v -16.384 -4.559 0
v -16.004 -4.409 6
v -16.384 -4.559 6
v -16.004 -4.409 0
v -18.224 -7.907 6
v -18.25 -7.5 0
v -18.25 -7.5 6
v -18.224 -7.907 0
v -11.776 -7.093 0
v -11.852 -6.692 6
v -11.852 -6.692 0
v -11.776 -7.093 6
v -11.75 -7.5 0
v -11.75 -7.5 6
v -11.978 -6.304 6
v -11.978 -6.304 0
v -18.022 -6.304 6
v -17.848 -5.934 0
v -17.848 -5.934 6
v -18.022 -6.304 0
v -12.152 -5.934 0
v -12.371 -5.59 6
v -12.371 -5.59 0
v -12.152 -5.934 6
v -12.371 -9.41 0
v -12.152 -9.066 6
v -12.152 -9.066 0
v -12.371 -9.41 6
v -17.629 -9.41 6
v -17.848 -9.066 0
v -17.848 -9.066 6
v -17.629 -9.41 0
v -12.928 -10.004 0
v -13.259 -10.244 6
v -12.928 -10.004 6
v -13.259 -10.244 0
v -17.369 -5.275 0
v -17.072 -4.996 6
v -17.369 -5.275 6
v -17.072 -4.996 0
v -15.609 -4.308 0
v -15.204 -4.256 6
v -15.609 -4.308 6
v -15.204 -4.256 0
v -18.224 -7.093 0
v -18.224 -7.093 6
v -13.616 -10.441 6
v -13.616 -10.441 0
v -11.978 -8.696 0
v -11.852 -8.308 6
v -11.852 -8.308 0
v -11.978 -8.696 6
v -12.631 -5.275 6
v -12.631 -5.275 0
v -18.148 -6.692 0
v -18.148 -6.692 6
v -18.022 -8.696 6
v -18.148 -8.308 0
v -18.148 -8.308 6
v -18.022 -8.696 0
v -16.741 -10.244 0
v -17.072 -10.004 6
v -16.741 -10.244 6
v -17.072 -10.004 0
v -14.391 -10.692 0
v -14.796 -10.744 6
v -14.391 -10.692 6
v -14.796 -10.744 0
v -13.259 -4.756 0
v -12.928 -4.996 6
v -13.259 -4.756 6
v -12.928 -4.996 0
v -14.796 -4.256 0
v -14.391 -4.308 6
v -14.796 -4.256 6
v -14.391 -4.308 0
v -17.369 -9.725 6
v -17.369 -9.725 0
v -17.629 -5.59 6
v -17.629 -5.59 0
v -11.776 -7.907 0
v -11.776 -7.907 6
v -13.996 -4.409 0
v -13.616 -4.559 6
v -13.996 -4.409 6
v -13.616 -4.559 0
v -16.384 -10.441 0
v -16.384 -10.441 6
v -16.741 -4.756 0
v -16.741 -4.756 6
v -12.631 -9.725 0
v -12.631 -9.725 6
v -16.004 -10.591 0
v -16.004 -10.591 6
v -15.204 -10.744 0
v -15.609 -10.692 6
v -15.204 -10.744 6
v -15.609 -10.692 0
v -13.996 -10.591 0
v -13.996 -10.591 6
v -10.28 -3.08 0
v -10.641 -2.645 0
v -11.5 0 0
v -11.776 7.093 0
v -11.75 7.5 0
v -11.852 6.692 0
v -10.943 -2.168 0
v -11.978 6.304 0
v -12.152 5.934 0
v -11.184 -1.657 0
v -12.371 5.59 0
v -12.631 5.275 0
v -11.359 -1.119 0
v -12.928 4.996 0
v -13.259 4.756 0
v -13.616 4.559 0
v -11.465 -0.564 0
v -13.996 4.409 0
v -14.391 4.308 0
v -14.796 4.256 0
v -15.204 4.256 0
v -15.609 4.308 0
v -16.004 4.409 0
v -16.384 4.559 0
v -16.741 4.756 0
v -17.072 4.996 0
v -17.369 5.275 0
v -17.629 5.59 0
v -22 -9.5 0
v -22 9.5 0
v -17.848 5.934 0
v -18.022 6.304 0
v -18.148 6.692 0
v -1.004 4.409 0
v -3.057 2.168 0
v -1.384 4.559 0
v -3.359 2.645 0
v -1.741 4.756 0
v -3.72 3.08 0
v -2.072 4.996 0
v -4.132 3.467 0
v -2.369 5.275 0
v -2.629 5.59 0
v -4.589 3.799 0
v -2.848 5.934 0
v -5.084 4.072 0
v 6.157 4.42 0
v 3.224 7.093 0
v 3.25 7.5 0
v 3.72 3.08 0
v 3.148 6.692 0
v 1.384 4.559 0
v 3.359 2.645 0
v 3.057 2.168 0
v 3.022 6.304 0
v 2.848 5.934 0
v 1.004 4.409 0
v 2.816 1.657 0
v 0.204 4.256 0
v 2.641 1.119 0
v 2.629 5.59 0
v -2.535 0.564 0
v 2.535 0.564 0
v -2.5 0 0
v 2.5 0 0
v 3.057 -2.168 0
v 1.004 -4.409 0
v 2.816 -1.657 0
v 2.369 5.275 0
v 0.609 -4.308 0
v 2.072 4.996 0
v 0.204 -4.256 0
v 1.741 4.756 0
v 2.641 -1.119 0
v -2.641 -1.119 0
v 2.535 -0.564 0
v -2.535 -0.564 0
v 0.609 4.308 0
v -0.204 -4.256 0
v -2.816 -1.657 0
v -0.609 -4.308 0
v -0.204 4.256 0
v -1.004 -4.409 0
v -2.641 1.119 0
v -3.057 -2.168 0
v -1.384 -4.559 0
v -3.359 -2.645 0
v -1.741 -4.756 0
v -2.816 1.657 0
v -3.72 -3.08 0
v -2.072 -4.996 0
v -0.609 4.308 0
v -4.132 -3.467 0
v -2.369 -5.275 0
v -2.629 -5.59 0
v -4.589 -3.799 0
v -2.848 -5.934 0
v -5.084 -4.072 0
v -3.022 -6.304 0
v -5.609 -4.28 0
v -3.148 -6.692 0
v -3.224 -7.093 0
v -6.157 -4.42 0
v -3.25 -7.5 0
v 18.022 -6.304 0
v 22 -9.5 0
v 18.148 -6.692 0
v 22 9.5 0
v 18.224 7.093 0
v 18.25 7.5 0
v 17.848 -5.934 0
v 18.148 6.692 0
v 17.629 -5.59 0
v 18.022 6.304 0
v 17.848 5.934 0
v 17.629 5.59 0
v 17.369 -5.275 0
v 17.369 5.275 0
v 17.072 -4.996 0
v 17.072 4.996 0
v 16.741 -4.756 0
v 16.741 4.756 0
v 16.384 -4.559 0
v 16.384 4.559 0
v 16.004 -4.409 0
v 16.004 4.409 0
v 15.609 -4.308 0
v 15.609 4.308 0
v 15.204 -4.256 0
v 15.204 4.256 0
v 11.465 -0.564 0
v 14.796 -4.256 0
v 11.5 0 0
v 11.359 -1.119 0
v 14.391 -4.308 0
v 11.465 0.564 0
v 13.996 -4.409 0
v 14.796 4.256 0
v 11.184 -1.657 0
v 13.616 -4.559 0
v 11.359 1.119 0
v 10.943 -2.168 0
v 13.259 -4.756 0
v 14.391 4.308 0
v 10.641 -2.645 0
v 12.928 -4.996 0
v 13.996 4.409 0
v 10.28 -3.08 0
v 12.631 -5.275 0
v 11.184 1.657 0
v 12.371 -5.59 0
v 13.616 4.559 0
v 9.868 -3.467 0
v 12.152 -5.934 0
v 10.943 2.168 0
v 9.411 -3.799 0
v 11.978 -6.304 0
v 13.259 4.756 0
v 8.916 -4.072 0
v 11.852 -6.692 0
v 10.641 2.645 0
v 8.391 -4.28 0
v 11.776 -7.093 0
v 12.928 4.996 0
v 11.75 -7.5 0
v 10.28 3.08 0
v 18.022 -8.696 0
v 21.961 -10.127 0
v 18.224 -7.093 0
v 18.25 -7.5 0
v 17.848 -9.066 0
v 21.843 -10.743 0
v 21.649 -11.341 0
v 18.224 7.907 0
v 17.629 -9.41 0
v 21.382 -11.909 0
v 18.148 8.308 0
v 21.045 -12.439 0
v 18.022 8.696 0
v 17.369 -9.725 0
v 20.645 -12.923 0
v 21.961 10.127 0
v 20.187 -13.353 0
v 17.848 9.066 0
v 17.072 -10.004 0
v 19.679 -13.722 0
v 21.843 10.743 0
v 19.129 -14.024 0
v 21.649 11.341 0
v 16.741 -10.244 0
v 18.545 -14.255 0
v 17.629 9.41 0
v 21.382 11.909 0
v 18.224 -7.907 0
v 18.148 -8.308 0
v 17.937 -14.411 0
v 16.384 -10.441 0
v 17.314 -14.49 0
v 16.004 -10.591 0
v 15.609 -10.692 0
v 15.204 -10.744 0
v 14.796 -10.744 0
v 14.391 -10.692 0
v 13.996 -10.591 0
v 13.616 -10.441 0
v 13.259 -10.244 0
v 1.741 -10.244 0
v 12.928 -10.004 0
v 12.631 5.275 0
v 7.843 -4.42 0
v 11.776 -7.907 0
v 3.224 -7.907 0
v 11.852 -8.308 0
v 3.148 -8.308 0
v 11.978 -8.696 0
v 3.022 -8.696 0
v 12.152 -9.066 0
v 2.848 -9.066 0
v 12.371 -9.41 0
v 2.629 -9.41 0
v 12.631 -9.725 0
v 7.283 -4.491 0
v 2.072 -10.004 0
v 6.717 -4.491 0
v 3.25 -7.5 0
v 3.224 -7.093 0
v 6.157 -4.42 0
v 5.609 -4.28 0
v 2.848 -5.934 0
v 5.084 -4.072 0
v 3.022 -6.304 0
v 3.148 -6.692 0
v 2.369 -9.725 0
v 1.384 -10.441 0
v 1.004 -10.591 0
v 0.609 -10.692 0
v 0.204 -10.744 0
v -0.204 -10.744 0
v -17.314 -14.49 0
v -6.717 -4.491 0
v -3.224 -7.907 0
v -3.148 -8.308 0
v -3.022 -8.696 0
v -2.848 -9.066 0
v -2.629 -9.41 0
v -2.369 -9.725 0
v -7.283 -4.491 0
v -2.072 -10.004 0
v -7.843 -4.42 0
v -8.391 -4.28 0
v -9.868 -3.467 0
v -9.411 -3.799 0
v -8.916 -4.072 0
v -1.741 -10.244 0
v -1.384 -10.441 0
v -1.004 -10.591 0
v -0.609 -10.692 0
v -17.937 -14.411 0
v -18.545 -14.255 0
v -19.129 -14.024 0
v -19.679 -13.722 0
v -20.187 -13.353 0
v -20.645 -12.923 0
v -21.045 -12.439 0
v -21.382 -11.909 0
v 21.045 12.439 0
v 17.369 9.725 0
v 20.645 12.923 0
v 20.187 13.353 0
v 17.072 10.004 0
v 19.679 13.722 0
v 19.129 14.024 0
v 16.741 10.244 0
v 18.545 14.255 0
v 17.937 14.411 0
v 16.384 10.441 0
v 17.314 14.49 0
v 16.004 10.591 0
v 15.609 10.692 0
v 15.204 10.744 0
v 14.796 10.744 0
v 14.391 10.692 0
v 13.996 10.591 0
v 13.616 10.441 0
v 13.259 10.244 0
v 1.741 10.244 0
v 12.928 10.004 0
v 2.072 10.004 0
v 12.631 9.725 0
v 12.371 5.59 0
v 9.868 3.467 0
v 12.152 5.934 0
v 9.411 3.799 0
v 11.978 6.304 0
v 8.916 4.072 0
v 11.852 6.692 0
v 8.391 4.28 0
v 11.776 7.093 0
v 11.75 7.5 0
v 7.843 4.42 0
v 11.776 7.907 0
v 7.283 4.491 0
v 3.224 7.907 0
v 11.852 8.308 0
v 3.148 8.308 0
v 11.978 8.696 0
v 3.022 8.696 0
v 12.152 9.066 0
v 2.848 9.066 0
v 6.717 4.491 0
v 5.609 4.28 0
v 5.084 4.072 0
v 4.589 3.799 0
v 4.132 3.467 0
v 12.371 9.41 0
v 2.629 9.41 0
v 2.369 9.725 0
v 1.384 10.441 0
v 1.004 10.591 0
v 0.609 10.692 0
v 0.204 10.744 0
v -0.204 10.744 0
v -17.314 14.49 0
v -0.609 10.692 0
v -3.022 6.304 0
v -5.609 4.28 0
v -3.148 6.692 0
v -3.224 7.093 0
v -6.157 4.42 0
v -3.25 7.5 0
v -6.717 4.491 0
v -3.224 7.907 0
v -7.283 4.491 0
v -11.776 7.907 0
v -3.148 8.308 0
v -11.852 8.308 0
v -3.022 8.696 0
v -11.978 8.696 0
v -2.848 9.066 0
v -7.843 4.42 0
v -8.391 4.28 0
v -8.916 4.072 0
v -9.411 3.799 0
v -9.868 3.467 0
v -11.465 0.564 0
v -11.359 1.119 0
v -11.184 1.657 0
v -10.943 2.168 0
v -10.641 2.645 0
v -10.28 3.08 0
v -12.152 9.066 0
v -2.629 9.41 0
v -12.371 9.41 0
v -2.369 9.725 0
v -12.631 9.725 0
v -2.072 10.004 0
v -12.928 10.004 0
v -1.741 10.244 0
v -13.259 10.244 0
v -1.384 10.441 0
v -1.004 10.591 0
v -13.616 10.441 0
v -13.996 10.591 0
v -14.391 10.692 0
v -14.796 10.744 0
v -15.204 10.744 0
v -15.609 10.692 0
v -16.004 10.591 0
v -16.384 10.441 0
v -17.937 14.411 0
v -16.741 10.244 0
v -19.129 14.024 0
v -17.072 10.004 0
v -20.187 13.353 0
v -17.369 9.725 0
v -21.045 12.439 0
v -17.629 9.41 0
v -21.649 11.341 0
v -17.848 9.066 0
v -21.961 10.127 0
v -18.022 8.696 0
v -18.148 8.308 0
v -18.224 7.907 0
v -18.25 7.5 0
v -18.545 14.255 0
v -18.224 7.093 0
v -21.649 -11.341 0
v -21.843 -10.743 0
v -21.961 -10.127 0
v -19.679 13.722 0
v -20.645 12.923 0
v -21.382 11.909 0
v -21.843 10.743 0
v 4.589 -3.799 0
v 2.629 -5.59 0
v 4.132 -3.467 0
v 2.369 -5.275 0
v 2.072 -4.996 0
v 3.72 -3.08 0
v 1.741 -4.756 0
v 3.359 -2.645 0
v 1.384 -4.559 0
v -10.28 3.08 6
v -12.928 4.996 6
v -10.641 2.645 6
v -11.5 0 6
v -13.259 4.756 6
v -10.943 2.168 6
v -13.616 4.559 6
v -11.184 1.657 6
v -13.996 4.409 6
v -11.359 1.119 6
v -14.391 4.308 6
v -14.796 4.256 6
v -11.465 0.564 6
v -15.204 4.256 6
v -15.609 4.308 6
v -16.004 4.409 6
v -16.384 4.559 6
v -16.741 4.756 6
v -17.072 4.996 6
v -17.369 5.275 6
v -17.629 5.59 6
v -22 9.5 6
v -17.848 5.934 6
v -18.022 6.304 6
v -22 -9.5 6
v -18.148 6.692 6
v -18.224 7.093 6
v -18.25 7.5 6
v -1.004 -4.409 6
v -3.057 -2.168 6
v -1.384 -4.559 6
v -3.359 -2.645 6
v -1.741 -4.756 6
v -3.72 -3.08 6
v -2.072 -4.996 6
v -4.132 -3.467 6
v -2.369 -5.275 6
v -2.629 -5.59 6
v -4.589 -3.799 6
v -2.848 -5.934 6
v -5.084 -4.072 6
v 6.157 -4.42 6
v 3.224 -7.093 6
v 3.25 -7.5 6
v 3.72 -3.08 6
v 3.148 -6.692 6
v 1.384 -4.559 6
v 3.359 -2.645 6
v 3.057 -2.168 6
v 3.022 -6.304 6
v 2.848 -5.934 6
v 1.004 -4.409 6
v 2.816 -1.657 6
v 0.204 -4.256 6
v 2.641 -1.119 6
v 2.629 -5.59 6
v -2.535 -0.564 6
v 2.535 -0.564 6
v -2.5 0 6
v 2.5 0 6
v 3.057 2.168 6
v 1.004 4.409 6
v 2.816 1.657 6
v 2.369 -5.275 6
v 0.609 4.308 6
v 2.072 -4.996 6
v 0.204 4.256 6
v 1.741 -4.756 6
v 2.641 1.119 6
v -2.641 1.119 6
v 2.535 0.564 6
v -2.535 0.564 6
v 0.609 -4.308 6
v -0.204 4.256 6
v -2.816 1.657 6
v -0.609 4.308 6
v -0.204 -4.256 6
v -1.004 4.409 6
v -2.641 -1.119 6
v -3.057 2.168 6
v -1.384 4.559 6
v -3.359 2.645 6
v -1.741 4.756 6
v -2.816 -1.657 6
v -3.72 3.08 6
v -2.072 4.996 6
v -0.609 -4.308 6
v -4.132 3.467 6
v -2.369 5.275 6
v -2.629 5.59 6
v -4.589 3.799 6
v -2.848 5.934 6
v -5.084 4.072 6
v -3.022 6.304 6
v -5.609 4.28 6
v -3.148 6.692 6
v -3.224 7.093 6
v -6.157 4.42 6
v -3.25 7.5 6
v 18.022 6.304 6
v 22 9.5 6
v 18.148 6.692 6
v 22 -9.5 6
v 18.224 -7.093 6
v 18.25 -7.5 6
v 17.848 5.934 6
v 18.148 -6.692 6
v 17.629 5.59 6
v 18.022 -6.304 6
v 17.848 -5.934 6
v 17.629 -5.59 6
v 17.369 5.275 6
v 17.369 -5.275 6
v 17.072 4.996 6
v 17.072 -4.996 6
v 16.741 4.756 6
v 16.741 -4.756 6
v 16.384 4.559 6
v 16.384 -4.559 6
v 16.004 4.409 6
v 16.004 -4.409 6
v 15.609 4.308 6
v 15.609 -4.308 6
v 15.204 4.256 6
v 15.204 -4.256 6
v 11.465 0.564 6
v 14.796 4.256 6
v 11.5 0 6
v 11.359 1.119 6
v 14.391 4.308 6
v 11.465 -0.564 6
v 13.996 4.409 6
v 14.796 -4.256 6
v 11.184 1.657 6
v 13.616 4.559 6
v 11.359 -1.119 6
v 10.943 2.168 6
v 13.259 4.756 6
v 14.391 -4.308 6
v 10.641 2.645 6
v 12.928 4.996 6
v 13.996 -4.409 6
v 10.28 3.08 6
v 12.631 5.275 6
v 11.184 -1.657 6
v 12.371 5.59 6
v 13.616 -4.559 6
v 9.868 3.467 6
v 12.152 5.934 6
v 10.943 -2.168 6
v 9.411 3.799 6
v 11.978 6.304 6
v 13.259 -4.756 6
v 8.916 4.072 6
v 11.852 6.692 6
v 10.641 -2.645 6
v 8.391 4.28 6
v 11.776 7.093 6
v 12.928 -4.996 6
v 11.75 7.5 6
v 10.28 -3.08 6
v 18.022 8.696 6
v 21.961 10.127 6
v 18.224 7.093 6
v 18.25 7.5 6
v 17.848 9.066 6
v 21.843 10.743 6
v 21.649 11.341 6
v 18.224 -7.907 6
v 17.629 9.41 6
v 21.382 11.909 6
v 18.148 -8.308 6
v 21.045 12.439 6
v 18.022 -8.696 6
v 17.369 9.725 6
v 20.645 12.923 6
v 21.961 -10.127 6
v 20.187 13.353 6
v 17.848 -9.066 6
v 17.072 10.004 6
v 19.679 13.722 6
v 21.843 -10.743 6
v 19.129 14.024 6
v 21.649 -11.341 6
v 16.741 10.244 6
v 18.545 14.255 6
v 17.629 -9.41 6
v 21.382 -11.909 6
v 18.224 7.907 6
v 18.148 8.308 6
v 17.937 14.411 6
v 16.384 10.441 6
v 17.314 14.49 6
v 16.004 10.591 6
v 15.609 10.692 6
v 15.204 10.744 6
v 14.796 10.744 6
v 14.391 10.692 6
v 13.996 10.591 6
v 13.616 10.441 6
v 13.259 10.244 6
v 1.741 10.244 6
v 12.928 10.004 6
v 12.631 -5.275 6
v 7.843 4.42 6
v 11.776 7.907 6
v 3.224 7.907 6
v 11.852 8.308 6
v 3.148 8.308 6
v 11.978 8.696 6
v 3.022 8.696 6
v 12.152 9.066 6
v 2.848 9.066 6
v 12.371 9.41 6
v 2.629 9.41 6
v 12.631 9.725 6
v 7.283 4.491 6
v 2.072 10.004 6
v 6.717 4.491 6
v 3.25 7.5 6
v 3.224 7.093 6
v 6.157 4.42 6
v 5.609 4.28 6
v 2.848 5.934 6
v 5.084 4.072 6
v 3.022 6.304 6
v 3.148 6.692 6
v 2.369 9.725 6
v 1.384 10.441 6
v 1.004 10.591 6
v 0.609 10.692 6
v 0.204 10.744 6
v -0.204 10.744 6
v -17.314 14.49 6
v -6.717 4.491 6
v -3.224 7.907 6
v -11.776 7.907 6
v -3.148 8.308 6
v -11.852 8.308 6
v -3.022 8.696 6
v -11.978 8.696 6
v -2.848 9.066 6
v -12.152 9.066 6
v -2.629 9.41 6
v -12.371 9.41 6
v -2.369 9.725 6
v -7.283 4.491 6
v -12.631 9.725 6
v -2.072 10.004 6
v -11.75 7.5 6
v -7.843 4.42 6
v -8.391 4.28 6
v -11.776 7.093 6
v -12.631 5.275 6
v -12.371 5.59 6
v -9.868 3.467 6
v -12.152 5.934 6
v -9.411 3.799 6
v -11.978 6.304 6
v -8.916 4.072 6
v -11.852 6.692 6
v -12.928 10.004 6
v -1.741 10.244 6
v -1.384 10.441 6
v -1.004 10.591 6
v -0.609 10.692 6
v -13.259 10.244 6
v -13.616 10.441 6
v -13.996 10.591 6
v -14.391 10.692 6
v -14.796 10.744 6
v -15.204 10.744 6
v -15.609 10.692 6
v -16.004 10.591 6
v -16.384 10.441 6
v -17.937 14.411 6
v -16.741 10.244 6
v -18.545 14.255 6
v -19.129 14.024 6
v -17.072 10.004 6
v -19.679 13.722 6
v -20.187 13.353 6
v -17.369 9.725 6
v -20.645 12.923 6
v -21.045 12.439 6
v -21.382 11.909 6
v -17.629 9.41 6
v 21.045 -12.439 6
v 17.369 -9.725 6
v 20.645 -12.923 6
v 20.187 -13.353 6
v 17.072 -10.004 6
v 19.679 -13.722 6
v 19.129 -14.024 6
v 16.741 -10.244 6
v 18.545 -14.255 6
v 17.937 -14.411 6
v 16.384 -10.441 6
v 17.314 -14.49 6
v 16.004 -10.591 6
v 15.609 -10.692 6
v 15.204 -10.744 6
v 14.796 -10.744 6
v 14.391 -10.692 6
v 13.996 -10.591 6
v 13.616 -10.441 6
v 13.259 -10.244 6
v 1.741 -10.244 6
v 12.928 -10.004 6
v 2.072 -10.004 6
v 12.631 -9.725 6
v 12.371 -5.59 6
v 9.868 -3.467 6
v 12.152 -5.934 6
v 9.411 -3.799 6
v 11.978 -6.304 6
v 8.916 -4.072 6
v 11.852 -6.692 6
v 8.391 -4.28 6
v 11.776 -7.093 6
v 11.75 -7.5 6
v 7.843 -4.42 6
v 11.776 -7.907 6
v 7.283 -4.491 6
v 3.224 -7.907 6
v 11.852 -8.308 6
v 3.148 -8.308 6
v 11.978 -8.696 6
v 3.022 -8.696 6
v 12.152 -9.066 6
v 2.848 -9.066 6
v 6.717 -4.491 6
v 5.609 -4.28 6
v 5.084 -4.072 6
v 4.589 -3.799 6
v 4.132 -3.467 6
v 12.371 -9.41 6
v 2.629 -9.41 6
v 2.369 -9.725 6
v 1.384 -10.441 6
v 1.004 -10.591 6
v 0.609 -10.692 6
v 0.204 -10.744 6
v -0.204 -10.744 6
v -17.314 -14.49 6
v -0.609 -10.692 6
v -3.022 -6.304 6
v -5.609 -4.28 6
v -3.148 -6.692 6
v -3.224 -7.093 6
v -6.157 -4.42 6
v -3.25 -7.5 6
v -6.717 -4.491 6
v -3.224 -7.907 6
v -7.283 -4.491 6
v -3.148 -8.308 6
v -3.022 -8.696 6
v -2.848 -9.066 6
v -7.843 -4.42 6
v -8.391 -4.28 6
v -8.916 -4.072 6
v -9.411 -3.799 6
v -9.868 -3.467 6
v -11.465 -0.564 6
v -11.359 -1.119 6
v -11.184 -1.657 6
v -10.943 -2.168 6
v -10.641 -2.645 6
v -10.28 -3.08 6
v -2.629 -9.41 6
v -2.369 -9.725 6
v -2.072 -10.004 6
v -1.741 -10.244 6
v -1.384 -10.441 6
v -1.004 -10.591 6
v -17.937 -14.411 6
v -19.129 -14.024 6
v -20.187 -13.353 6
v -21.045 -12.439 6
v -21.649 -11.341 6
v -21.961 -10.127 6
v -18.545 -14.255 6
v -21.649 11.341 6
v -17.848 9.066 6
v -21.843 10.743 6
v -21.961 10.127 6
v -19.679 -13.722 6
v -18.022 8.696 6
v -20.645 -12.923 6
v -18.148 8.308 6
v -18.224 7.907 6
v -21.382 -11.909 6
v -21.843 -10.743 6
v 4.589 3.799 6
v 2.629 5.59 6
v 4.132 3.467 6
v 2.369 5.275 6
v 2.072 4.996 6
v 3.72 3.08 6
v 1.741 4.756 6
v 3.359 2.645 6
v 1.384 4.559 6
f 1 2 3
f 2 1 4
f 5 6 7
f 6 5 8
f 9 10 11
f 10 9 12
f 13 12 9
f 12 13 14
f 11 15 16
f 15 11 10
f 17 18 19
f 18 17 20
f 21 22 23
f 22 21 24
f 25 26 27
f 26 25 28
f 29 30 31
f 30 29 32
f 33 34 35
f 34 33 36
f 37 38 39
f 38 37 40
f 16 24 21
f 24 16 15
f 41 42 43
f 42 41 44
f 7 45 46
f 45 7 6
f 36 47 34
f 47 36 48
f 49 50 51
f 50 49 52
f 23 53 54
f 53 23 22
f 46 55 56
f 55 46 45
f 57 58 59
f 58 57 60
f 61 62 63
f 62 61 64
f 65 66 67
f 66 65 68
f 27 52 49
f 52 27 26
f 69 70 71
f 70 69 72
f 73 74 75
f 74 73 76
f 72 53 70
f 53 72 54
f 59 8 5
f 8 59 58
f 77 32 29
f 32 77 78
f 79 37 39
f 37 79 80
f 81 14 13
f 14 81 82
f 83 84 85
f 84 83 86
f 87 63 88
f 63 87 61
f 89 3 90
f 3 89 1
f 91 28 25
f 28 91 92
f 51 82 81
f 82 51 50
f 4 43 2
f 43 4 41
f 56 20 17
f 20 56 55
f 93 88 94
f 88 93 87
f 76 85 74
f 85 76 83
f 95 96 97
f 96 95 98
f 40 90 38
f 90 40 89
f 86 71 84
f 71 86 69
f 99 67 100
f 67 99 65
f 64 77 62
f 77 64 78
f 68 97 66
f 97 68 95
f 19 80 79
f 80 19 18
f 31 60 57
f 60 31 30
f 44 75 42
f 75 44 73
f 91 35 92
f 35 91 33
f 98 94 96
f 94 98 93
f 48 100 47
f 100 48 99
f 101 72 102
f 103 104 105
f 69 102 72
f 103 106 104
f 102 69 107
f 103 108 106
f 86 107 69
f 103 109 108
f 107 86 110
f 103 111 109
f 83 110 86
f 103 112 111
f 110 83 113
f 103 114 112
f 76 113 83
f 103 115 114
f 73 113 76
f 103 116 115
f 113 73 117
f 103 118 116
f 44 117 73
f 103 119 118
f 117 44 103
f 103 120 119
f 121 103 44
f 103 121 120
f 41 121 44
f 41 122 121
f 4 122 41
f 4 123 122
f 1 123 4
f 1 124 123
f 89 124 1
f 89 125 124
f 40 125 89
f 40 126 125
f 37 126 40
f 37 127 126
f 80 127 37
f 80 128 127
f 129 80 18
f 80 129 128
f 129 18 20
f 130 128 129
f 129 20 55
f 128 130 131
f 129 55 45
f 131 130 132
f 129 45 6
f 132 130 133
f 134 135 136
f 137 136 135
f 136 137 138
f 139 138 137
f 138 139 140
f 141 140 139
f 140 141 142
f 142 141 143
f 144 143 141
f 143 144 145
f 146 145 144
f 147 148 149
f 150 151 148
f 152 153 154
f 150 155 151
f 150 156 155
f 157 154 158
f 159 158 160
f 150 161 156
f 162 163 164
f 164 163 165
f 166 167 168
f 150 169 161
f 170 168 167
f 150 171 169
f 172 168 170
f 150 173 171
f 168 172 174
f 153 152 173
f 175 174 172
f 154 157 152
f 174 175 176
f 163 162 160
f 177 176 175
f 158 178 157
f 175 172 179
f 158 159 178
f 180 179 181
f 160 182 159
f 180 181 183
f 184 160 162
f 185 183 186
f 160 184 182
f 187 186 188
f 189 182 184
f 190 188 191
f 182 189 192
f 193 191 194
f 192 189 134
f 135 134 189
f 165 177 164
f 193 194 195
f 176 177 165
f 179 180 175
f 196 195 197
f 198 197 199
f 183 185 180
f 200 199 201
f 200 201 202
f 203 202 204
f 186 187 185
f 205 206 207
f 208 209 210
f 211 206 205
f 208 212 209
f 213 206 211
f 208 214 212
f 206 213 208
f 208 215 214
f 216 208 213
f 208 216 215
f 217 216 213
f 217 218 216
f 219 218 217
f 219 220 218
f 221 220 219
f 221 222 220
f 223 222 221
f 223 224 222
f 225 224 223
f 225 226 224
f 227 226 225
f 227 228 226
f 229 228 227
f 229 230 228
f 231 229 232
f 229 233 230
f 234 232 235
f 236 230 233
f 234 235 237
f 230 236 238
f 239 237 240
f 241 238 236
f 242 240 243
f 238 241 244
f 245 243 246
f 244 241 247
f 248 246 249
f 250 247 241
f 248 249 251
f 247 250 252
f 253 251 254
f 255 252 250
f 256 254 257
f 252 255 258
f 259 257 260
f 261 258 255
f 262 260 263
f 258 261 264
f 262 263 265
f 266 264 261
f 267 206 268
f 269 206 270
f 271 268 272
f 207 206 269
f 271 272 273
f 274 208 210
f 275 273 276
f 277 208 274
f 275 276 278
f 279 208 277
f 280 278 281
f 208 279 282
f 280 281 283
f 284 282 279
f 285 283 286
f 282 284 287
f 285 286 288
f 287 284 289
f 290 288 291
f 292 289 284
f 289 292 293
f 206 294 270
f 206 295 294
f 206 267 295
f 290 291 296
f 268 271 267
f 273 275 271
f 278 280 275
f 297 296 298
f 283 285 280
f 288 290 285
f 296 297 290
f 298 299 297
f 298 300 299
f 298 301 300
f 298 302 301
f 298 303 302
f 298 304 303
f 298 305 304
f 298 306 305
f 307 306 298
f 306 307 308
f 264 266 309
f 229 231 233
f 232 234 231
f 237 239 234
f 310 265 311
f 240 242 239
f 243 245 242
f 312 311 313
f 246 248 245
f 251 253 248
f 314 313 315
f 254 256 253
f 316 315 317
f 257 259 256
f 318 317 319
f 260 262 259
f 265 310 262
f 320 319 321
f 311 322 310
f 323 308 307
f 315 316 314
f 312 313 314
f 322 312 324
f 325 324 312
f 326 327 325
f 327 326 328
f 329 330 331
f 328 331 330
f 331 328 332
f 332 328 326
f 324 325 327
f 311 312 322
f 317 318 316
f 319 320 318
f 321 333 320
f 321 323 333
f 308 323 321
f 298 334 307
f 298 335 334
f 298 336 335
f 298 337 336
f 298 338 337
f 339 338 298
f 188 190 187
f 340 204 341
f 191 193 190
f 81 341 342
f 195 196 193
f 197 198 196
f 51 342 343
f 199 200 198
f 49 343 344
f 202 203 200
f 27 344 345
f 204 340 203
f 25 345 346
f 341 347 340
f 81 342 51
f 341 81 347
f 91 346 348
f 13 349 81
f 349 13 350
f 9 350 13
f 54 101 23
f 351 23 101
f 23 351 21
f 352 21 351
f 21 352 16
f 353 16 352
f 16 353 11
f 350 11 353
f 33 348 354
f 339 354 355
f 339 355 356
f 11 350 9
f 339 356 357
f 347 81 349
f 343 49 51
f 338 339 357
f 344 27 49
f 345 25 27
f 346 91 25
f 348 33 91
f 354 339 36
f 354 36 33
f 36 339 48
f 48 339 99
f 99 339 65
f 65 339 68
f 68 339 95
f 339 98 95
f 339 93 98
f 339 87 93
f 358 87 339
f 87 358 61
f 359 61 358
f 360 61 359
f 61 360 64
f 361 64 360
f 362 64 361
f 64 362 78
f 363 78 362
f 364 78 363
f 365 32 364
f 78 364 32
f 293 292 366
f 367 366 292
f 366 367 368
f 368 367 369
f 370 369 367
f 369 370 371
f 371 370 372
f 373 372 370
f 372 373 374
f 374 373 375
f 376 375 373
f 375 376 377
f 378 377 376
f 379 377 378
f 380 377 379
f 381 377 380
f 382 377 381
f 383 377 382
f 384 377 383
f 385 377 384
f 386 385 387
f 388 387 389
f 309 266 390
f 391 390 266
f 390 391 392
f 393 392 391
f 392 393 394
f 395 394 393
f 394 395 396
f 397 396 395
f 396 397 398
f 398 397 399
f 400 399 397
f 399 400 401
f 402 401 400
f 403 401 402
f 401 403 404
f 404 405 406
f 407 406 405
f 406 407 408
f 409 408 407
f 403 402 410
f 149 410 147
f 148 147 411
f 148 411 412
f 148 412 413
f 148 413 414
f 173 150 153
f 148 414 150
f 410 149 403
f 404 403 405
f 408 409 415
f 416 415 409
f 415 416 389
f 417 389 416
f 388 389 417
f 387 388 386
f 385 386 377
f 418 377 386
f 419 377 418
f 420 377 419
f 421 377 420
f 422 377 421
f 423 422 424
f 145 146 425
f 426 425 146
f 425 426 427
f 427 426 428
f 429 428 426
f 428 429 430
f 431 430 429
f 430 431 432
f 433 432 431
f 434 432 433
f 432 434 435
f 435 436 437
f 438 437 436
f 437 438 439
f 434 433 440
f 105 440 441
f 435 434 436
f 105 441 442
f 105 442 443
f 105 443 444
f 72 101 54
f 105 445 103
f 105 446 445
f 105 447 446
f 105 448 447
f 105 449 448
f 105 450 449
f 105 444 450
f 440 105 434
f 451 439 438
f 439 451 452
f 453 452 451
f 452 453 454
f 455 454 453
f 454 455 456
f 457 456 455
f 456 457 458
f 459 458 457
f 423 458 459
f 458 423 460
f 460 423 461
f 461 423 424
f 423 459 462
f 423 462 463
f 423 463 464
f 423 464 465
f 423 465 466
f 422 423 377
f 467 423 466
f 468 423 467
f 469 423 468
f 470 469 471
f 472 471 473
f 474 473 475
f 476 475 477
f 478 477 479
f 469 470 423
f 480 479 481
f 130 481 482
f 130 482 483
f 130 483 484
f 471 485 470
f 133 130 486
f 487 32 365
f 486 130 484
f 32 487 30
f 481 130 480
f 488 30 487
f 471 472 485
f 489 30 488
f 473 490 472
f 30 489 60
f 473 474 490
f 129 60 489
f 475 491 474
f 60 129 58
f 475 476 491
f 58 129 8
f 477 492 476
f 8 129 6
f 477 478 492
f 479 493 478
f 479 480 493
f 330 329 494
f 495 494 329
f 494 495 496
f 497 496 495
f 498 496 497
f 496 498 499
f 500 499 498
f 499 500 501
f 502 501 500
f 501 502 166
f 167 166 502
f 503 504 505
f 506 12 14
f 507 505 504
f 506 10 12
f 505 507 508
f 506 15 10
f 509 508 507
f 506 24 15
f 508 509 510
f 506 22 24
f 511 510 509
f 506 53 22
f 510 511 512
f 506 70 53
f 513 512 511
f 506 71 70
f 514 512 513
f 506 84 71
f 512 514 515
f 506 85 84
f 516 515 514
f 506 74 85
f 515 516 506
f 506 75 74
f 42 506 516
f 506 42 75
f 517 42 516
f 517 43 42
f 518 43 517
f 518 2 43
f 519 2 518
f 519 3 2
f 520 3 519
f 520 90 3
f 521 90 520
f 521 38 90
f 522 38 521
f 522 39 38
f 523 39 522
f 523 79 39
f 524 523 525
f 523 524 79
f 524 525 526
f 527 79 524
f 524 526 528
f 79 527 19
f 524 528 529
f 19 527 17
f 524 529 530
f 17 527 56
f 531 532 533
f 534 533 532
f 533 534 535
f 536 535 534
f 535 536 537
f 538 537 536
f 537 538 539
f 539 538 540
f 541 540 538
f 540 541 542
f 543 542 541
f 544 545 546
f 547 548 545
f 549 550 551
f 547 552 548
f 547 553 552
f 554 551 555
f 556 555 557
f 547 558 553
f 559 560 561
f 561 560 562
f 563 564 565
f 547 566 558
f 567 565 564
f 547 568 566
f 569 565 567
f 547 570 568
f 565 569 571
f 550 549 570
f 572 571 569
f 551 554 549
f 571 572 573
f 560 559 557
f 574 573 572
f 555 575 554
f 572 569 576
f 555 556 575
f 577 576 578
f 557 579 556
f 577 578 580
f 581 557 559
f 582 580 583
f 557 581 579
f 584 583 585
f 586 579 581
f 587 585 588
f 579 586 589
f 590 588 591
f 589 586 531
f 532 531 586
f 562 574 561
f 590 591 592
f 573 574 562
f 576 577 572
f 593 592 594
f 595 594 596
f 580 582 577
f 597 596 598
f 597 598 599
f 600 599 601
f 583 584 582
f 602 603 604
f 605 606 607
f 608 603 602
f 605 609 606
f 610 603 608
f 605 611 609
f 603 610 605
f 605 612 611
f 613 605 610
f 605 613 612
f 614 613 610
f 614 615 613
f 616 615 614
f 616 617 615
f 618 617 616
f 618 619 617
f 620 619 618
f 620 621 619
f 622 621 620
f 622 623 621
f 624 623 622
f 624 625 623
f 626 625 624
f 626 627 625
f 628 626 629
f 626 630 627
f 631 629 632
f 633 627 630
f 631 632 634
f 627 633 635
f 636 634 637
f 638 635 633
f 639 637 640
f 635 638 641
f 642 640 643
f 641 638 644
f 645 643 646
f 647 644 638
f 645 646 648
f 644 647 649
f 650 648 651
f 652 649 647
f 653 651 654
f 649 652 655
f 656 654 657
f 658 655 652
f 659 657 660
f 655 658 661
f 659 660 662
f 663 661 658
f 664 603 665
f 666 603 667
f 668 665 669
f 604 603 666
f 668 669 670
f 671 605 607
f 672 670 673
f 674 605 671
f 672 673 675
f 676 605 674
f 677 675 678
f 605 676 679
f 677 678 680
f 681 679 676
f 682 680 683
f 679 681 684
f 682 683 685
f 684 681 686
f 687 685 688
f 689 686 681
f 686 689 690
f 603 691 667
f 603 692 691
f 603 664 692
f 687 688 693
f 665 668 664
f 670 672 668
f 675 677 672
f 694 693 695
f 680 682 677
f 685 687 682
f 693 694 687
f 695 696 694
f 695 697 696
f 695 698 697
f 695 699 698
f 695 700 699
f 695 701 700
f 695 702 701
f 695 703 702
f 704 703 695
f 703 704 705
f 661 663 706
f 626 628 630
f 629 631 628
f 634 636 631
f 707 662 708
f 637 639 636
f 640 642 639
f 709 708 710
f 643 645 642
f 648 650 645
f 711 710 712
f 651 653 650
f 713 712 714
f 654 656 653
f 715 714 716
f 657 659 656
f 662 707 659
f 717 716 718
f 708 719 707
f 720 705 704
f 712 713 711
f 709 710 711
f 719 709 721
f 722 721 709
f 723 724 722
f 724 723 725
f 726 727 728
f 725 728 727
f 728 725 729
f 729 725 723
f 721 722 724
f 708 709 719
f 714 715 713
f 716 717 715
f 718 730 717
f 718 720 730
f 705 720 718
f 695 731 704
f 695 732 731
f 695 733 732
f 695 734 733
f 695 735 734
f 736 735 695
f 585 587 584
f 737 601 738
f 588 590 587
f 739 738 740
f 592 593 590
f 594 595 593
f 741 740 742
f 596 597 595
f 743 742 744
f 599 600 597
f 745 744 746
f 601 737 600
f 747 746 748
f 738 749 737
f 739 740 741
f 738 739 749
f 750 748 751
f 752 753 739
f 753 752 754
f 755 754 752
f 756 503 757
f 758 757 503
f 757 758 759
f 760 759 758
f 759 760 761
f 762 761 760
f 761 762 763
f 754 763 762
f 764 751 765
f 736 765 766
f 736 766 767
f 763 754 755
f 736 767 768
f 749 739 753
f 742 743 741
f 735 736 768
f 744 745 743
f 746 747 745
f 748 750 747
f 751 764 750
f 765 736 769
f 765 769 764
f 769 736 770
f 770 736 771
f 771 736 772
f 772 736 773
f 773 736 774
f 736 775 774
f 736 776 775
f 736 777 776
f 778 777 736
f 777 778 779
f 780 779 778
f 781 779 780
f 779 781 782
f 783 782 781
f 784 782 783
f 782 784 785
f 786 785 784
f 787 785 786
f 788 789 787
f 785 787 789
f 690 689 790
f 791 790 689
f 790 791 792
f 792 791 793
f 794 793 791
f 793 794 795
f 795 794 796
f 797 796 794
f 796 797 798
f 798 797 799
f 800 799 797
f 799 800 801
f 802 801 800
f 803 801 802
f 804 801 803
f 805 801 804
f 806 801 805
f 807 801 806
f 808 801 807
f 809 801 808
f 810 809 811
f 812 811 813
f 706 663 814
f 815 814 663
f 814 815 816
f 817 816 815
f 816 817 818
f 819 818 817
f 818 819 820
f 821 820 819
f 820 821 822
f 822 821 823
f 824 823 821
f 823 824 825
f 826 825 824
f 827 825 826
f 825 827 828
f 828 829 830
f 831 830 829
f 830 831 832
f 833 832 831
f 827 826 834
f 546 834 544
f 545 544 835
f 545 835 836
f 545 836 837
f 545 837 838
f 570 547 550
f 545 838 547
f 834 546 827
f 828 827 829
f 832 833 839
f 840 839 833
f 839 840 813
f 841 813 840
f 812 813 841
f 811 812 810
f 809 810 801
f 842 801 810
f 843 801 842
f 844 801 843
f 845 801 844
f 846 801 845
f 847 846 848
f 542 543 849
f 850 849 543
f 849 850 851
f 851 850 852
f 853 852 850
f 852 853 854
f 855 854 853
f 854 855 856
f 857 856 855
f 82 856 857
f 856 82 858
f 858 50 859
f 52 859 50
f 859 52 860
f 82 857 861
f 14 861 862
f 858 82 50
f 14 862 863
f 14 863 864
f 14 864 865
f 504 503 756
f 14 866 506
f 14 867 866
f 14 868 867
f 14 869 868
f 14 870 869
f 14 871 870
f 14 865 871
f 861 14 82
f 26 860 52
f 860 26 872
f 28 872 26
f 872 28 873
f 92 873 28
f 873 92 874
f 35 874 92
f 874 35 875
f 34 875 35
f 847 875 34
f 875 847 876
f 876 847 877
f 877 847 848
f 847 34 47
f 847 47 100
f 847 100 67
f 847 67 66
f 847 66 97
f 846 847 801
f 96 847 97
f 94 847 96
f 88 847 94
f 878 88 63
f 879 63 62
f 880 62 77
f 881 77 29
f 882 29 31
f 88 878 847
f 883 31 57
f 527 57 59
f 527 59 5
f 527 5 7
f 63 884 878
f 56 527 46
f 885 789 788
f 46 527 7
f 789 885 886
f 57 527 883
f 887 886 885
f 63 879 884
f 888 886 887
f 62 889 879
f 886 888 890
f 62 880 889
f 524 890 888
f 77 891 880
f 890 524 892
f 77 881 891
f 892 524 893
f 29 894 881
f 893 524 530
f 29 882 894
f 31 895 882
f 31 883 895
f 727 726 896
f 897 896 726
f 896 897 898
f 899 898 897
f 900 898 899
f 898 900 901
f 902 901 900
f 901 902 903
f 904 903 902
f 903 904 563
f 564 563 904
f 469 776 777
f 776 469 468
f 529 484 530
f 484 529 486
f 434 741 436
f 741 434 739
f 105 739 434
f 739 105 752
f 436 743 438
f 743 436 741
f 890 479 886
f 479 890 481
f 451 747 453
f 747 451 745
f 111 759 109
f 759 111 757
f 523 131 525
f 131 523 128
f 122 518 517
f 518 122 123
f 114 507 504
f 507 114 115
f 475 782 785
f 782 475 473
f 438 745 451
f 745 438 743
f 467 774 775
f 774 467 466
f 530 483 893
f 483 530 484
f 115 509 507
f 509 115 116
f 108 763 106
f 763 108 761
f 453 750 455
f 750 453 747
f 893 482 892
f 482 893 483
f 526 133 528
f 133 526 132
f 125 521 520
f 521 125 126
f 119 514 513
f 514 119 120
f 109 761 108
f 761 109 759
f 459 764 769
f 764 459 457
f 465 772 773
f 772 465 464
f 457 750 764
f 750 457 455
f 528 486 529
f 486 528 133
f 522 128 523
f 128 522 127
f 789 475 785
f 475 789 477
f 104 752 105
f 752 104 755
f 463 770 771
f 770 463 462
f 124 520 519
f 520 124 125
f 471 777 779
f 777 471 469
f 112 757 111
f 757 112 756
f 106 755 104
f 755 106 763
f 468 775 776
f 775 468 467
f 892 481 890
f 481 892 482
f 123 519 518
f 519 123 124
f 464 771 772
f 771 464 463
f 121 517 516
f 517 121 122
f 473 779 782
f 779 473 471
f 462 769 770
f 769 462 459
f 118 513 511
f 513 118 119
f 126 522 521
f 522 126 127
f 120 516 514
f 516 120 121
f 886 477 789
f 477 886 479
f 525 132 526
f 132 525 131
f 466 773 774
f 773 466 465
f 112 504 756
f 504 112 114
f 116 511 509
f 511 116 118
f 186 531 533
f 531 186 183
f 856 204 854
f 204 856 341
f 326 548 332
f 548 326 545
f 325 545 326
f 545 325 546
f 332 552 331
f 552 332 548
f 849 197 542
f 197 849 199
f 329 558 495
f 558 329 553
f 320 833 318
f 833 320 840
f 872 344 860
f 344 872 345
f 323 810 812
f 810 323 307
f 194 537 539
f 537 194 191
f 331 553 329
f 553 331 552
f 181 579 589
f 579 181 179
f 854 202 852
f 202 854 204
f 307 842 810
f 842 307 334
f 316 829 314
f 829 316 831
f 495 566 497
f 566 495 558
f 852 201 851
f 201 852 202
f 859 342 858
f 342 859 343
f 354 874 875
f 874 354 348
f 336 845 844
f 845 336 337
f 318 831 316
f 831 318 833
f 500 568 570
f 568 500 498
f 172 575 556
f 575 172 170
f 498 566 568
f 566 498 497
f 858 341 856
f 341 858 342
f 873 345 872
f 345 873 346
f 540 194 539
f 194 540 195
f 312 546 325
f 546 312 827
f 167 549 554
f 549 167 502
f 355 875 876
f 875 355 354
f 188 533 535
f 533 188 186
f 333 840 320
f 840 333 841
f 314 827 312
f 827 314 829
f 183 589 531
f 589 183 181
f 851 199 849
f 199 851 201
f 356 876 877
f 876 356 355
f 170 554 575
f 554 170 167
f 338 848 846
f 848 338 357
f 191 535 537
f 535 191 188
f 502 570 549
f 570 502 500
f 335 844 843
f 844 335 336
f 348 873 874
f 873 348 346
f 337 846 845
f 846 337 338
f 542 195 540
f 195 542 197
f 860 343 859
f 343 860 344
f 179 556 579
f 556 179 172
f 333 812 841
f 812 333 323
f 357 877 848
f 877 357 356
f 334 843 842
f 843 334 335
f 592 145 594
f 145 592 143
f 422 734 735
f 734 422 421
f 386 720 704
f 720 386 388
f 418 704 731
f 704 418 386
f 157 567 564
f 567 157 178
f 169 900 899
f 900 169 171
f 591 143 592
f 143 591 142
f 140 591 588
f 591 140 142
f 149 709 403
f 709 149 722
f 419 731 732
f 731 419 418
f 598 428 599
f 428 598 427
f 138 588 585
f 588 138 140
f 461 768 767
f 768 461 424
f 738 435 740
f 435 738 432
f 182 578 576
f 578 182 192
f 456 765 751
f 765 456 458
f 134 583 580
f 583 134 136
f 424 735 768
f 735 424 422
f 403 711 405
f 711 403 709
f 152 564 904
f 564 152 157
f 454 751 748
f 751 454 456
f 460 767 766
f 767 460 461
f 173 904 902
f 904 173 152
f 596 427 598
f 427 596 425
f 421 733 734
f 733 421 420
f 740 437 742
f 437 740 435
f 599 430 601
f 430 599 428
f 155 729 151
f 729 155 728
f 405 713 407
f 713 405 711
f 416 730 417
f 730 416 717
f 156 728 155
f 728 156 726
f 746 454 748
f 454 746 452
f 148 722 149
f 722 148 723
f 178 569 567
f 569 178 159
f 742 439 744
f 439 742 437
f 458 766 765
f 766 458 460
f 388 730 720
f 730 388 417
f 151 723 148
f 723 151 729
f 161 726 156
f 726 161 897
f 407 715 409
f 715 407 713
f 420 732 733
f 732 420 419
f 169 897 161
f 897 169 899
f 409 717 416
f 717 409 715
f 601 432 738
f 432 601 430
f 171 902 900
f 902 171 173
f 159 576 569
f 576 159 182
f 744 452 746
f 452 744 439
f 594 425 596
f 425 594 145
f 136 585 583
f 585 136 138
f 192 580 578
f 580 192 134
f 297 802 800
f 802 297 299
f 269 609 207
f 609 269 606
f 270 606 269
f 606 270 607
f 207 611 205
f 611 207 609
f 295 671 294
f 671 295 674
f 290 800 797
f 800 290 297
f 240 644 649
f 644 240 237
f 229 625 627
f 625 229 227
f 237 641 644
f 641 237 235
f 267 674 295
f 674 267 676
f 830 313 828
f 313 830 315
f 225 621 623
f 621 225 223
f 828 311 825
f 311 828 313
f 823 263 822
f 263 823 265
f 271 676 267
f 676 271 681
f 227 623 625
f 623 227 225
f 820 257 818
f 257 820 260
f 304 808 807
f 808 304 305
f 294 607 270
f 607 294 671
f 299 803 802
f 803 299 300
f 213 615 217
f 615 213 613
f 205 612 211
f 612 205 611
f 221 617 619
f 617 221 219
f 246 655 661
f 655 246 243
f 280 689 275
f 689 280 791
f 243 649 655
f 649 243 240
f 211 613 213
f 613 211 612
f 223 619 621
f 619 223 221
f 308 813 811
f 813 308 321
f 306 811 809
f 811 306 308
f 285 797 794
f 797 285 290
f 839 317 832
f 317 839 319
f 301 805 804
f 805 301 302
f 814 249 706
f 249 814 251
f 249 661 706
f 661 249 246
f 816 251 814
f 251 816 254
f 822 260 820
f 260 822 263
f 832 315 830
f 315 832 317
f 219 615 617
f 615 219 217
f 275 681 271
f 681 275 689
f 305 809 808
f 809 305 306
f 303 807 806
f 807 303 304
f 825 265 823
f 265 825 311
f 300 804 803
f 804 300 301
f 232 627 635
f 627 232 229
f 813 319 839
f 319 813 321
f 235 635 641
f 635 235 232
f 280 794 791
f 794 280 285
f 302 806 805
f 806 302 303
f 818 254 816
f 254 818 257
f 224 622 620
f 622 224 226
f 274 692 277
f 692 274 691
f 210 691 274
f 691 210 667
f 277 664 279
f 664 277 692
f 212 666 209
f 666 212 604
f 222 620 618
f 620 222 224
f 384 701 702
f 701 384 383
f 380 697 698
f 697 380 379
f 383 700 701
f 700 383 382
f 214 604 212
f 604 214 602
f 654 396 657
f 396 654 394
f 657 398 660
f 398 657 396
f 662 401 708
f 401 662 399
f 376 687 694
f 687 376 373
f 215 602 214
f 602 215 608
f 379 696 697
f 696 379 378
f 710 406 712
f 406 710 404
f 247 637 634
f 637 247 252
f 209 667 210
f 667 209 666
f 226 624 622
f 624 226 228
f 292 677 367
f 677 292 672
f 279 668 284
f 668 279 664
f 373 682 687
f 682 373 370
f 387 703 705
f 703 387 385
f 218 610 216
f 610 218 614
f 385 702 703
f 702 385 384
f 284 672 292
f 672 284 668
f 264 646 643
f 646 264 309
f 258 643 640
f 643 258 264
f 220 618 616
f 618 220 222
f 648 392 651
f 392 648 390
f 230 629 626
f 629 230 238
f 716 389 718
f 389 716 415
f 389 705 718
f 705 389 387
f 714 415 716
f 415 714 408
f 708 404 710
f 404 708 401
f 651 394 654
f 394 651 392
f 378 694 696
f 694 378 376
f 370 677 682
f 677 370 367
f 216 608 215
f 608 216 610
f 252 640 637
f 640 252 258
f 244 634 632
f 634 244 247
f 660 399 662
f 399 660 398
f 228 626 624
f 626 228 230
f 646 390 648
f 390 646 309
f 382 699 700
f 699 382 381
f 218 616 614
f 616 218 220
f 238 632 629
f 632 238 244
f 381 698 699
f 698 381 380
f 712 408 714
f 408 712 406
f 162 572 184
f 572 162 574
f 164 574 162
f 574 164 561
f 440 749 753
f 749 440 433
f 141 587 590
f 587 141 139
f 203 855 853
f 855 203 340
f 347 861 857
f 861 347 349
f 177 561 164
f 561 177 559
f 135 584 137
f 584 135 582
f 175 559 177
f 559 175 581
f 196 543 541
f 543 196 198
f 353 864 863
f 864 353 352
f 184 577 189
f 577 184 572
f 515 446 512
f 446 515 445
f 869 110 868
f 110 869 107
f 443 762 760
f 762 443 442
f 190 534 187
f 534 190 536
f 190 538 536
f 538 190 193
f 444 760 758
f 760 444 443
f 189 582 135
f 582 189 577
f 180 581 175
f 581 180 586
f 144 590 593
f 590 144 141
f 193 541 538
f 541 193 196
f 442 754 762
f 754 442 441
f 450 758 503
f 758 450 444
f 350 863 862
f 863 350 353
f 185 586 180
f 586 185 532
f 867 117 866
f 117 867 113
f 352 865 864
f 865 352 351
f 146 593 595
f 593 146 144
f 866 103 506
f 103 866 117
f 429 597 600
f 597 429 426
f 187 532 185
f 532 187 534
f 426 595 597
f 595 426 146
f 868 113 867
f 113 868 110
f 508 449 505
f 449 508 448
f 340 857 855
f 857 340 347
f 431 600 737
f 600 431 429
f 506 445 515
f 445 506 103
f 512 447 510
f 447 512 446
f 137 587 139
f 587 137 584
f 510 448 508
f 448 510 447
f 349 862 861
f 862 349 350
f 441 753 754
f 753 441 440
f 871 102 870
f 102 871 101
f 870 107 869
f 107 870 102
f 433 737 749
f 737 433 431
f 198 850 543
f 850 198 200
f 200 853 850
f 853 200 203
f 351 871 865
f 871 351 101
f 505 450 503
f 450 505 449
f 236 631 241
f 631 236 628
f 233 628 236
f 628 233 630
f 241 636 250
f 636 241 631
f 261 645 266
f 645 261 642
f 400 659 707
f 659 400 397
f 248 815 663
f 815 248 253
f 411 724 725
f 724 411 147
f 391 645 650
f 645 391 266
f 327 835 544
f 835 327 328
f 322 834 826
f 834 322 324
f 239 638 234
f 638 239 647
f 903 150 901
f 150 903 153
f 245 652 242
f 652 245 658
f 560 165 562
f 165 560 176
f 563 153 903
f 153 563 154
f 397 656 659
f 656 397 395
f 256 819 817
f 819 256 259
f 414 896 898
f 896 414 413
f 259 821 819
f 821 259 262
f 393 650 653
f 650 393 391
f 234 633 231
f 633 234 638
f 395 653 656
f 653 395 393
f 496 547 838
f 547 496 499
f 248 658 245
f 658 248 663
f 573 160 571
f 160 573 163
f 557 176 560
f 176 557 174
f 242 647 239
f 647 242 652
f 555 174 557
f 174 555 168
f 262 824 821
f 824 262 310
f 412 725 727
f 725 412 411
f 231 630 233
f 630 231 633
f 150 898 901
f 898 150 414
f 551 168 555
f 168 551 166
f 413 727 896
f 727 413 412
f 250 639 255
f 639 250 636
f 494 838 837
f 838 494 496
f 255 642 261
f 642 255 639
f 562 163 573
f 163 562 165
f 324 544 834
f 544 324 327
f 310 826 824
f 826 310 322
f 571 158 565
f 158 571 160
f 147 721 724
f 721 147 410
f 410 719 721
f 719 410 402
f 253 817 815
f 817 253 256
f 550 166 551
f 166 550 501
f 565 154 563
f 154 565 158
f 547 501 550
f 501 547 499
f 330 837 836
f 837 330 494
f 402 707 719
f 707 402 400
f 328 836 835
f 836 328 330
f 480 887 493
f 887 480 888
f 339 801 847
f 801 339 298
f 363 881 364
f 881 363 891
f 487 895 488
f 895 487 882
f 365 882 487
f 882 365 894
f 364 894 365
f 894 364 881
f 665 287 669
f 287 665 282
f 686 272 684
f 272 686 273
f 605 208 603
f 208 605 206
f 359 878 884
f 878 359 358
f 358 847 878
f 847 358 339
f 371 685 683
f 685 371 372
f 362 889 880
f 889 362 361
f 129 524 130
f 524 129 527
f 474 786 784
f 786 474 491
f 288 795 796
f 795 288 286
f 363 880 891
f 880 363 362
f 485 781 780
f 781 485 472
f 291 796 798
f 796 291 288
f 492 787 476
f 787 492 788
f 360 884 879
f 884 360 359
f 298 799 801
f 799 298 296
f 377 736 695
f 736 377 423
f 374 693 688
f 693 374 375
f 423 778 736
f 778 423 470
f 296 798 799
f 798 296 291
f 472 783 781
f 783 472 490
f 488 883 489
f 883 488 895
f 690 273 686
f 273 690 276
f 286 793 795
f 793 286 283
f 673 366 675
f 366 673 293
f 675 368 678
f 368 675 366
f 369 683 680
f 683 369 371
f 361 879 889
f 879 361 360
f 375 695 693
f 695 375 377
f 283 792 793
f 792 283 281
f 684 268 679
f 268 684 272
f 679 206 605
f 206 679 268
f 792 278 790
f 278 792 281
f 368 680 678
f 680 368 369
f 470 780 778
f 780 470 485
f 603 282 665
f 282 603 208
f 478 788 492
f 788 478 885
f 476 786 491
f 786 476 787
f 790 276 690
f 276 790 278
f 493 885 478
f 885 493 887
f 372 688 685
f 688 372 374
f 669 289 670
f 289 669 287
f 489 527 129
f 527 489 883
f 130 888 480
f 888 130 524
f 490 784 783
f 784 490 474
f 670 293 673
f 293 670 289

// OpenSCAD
$fn = 50;

difference() {
	union() {
		hull() {
			translate(v = [-17.0, 9.5, 0]) {
				cylinder(h = 6, r = 5);
			}
			translate(v = [17.0, 9.5, 0]) {
				cylinder(h = 6, r = 5);
			}
			translate(v = [-17.0, -9.5, 0]) {
				cylinder(h = 6, r = 5);
			}
			translate(v = [17.0, -9.5, 0]) {
				cylinder(h = 6, r = 5);
			}
		}
	}
	union() {
		translate(v = [-15.0, -7.5, 0]) {
			cylinder(h = 6, r = 3.25);
		}
		translate(v = [-15.0, 7.5, 0]) {
			cylinder(h = 6, r = 3.25);
		}
		translate(v = [0.0, -7.5, 0]) {
			cylinder(h = 6, r = 3.25);
		}
		translate(v = [0.0, 7.5, 0]) {
			cylinder(h = 6, r = 3.25);
		}
		translate(v = [15.0, -7.5, 0]) {
			cylinder(h = 6, r = 3.25);
		}
		translate(v = [15.0, 7.5, 0]) {
			cylinder(h = 6, r = 3.25);
		}
		translate(v = [-7.0, 0, 0.0]) {
			cylinder(h = 6, r = 4.5);
		}
		translate(v = [7.0, 0, 0.0]) {
			cylinder(h = 6, r = 4.5);
		}
	}
}
